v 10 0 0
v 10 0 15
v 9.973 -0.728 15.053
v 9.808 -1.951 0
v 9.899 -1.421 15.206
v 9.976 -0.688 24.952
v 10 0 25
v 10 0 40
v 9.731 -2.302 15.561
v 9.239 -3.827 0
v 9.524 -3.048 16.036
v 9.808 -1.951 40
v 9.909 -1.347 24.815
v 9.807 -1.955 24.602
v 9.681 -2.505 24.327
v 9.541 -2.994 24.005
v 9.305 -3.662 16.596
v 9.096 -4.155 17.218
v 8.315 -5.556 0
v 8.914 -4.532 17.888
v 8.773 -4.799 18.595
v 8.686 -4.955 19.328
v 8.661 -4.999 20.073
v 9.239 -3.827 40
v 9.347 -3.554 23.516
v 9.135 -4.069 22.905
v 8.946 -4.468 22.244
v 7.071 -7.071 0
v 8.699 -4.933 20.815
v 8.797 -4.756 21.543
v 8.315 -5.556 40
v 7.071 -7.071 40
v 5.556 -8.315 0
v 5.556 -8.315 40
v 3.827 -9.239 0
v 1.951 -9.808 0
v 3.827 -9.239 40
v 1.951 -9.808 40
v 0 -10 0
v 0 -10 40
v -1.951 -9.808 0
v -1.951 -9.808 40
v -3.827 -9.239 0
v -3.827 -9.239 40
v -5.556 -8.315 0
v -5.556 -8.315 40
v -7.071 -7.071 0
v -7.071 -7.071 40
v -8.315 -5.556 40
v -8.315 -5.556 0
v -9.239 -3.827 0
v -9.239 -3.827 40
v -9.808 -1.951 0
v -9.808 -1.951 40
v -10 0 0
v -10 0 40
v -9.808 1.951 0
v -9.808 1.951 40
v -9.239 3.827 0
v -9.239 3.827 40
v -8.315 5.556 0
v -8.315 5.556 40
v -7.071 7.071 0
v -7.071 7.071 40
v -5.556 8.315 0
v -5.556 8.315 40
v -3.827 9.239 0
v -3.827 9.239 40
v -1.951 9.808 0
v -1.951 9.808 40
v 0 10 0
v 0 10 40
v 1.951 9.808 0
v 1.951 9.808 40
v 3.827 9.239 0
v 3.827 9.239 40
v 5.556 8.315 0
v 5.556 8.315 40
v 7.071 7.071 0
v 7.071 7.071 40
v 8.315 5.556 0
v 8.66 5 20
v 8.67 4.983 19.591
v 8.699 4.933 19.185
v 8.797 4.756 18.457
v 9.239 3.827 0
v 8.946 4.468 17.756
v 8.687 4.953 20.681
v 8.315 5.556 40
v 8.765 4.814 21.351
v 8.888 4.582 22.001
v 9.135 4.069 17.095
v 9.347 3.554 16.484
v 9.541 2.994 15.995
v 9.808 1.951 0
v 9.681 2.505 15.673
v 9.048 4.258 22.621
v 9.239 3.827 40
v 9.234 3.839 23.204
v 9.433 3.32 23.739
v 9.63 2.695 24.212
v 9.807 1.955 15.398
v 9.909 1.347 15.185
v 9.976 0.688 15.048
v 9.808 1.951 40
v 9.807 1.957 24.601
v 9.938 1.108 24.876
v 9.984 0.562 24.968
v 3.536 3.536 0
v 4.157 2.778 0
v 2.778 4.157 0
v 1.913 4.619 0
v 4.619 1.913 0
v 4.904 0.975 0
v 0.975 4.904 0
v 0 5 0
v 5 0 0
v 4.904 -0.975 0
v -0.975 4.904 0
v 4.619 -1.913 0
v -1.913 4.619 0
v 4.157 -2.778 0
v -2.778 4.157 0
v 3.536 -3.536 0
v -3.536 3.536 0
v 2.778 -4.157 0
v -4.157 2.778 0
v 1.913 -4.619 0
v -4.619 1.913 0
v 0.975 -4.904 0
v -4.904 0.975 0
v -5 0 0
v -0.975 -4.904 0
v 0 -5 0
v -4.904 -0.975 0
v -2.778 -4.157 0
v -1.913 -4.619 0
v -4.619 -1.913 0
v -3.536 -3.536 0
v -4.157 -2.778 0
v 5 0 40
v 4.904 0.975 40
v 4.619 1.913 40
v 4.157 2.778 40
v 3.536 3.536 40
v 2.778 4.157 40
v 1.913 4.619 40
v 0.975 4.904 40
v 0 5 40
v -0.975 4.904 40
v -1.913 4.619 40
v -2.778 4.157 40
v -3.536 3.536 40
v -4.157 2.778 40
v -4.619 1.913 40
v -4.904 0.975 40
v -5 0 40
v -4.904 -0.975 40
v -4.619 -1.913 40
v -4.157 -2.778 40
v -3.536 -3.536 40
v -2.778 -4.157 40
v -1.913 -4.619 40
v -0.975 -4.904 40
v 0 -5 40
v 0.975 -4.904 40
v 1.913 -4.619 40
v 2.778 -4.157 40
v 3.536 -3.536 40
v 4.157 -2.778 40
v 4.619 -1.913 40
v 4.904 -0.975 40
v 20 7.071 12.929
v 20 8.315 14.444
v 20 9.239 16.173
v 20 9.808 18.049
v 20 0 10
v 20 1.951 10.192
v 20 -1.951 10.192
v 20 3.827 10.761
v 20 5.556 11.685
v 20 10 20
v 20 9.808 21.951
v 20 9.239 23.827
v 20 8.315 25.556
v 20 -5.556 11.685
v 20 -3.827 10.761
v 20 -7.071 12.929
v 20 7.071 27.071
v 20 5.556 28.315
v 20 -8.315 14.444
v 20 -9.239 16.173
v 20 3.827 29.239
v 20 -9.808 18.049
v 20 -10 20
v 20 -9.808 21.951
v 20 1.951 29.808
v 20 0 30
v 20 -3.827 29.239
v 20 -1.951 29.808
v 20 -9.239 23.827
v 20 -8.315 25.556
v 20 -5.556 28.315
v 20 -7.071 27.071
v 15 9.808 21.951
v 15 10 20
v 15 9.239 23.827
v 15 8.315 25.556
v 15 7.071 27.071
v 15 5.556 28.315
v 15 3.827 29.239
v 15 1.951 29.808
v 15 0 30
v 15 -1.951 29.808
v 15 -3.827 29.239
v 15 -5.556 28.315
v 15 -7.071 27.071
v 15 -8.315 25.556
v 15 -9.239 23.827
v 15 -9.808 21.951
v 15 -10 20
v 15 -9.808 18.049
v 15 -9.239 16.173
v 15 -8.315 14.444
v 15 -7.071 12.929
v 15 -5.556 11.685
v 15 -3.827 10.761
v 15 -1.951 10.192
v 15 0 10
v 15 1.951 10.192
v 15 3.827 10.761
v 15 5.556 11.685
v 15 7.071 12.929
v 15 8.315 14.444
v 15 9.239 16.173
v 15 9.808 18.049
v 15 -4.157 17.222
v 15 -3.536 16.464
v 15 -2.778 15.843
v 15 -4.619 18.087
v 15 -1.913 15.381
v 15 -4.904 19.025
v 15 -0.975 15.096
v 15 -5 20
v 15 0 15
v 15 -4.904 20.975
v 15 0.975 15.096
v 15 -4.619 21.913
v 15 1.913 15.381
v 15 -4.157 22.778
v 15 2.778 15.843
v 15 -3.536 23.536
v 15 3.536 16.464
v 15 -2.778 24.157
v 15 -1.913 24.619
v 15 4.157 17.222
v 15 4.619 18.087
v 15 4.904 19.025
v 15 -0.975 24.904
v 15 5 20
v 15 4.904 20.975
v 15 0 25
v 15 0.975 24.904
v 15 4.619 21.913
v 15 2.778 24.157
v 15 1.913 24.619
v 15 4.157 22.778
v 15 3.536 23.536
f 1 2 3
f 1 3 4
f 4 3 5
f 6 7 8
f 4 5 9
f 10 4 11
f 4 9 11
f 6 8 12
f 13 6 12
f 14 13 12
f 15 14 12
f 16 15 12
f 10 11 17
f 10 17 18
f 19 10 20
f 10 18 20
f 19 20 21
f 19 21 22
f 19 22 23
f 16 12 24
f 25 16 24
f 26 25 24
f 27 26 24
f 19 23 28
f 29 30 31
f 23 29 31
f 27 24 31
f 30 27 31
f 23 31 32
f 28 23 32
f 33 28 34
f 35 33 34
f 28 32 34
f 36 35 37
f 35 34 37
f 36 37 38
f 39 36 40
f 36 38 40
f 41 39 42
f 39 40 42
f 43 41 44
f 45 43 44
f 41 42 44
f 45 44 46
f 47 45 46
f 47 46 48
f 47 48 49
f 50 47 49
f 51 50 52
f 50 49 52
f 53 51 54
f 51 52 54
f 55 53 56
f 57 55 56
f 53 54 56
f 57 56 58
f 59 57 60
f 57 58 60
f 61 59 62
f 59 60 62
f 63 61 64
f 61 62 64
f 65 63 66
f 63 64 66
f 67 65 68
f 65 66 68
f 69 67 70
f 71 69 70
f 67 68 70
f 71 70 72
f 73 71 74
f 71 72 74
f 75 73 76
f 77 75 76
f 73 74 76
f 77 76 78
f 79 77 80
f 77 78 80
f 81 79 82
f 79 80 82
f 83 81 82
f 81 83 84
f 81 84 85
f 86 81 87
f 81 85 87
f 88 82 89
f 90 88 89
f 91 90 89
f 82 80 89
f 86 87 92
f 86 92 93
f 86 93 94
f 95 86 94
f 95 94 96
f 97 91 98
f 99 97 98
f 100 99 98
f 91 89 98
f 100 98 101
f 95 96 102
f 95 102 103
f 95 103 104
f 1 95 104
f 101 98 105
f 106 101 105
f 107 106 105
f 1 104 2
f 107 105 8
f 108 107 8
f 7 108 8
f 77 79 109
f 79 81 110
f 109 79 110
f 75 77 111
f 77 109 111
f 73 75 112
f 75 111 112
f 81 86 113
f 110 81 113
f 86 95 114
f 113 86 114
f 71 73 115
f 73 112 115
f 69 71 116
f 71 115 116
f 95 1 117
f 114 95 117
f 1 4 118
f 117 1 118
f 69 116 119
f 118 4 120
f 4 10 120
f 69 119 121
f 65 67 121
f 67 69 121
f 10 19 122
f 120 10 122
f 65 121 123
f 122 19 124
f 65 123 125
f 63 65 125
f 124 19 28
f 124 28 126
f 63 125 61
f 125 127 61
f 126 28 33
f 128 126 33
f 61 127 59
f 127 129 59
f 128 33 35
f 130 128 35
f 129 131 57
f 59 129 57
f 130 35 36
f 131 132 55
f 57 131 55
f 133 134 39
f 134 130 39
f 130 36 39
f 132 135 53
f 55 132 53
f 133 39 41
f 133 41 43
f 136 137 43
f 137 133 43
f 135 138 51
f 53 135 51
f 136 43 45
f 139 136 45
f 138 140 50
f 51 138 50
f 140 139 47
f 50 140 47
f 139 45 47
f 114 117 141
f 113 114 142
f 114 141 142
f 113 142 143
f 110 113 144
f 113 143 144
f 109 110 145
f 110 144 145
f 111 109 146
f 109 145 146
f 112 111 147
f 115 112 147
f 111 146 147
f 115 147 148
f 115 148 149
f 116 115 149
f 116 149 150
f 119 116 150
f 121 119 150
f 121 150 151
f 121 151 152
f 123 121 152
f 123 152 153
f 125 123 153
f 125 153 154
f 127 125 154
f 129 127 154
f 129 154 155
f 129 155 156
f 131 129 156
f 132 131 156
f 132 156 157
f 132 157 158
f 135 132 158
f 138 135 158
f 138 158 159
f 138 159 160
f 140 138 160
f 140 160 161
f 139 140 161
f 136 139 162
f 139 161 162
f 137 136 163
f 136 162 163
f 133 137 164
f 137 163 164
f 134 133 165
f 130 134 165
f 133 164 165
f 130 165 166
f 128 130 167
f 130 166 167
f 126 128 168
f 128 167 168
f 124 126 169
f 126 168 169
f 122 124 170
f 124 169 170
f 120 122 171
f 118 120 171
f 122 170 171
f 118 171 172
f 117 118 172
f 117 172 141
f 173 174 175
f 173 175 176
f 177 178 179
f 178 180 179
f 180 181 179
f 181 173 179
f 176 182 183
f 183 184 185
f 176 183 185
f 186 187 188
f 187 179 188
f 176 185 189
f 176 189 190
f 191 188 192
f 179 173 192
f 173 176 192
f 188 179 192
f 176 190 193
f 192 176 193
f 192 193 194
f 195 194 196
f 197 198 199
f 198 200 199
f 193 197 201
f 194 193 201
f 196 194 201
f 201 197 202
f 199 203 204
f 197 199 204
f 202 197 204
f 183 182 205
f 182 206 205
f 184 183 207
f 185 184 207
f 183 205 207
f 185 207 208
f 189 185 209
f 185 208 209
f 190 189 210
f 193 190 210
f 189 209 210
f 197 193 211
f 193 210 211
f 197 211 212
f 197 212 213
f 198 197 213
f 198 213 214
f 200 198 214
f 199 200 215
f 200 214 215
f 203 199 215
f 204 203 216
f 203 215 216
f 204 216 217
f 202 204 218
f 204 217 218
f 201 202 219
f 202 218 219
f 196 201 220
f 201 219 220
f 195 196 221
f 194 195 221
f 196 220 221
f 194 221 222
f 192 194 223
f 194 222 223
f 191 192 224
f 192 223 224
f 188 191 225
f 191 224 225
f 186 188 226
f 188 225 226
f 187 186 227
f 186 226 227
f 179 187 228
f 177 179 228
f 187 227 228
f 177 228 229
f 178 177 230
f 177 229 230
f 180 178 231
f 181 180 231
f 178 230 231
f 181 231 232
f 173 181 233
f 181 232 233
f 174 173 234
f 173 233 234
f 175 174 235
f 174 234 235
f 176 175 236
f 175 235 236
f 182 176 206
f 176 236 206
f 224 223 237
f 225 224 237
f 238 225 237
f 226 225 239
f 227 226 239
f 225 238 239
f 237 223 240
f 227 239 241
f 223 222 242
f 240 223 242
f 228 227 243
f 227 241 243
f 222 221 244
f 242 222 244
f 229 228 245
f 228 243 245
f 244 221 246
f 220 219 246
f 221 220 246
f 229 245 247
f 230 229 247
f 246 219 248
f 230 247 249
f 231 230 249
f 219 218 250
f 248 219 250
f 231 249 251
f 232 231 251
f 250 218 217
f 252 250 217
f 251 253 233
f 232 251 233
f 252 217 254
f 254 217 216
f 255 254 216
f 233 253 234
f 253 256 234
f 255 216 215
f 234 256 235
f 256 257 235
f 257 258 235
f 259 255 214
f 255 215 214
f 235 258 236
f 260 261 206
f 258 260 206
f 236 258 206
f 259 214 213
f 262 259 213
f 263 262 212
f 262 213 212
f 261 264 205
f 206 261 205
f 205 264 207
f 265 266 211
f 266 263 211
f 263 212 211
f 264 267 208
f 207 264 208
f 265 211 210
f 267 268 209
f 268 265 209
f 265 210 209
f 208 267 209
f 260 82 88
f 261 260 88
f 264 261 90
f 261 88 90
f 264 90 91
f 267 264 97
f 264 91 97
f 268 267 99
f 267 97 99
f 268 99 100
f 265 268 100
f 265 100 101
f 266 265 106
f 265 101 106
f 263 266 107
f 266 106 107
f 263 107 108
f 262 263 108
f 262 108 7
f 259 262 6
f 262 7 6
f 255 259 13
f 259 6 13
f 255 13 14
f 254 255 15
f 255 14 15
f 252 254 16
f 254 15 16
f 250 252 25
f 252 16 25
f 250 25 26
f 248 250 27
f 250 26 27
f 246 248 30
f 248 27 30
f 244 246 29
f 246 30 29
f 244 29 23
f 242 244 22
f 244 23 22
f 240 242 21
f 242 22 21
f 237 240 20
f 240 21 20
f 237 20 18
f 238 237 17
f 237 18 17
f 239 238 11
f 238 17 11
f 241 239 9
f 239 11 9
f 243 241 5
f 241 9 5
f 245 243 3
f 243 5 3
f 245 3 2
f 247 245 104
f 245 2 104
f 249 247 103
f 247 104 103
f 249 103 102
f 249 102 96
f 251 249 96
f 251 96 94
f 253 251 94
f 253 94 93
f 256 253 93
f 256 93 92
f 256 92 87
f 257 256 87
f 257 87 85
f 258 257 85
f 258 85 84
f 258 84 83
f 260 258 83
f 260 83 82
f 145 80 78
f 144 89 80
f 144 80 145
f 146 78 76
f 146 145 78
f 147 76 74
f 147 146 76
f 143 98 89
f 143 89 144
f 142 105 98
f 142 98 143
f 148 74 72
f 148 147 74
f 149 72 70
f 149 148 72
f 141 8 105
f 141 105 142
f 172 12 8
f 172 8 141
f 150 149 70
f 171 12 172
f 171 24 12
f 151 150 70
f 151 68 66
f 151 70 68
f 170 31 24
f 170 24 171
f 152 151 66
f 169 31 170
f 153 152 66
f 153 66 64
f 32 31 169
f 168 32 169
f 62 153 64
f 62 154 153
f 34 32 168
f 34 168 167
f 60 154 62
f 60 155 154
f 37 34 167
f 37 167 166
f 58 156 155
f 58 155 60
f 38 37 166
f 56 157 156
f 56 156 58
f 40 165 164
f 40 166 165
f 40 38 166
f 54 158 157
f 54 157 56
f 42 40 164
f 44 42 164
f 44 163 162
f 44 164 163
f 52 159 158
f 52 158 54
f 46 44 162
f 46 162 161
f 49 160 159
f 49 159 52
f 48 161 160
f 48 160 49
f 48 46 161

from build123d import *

# Parameters (mm, degrees)
SKETCH1_W                      = 10
SKETCH1_H                      = 40
F_10_0_10_DIAMETER_HOLE1_D     = 10
F_10_0_10_DIAMETER_HOLE1_DEPTH = 40


with BuildPart() as part:
    # Sketch1 → Revolve1 (revolve)
    with BuildSketch(Plane.XZ):
        with Locations((5, 20)):
            Rectangle(SKETCH1_W, SKETCH1_H)
    revolve(axis=Axis((0, 0, 40), (0, 0, -1)))

    # Sketch2 → Revolve2 (revolve)
    with BuildSketch(Plane.XY.offset(20)):
        Polygon((20, 0), (20, 10), (15, 10), (15, 5), (8.660254038, 5), (8.660254038, 0), align=None)
    revolve(axis=Axis((8.660254038, 0, 20), (1, 0, 0)))

    # Ø10.0 (10) Diameter Hole1
    with Locations(Plane(origin=(0, 0, 0), x_dir=(-1, 0, 0), z_dir=(0, 0, -1))):
        with Locations((0, 0)):
            Hole(F_10_0_10_DIAMETER_HOLE1_D / 2, depth=F_10_0_10_DIAMETER_HOLE1_DEPTH)


solid = part.part
